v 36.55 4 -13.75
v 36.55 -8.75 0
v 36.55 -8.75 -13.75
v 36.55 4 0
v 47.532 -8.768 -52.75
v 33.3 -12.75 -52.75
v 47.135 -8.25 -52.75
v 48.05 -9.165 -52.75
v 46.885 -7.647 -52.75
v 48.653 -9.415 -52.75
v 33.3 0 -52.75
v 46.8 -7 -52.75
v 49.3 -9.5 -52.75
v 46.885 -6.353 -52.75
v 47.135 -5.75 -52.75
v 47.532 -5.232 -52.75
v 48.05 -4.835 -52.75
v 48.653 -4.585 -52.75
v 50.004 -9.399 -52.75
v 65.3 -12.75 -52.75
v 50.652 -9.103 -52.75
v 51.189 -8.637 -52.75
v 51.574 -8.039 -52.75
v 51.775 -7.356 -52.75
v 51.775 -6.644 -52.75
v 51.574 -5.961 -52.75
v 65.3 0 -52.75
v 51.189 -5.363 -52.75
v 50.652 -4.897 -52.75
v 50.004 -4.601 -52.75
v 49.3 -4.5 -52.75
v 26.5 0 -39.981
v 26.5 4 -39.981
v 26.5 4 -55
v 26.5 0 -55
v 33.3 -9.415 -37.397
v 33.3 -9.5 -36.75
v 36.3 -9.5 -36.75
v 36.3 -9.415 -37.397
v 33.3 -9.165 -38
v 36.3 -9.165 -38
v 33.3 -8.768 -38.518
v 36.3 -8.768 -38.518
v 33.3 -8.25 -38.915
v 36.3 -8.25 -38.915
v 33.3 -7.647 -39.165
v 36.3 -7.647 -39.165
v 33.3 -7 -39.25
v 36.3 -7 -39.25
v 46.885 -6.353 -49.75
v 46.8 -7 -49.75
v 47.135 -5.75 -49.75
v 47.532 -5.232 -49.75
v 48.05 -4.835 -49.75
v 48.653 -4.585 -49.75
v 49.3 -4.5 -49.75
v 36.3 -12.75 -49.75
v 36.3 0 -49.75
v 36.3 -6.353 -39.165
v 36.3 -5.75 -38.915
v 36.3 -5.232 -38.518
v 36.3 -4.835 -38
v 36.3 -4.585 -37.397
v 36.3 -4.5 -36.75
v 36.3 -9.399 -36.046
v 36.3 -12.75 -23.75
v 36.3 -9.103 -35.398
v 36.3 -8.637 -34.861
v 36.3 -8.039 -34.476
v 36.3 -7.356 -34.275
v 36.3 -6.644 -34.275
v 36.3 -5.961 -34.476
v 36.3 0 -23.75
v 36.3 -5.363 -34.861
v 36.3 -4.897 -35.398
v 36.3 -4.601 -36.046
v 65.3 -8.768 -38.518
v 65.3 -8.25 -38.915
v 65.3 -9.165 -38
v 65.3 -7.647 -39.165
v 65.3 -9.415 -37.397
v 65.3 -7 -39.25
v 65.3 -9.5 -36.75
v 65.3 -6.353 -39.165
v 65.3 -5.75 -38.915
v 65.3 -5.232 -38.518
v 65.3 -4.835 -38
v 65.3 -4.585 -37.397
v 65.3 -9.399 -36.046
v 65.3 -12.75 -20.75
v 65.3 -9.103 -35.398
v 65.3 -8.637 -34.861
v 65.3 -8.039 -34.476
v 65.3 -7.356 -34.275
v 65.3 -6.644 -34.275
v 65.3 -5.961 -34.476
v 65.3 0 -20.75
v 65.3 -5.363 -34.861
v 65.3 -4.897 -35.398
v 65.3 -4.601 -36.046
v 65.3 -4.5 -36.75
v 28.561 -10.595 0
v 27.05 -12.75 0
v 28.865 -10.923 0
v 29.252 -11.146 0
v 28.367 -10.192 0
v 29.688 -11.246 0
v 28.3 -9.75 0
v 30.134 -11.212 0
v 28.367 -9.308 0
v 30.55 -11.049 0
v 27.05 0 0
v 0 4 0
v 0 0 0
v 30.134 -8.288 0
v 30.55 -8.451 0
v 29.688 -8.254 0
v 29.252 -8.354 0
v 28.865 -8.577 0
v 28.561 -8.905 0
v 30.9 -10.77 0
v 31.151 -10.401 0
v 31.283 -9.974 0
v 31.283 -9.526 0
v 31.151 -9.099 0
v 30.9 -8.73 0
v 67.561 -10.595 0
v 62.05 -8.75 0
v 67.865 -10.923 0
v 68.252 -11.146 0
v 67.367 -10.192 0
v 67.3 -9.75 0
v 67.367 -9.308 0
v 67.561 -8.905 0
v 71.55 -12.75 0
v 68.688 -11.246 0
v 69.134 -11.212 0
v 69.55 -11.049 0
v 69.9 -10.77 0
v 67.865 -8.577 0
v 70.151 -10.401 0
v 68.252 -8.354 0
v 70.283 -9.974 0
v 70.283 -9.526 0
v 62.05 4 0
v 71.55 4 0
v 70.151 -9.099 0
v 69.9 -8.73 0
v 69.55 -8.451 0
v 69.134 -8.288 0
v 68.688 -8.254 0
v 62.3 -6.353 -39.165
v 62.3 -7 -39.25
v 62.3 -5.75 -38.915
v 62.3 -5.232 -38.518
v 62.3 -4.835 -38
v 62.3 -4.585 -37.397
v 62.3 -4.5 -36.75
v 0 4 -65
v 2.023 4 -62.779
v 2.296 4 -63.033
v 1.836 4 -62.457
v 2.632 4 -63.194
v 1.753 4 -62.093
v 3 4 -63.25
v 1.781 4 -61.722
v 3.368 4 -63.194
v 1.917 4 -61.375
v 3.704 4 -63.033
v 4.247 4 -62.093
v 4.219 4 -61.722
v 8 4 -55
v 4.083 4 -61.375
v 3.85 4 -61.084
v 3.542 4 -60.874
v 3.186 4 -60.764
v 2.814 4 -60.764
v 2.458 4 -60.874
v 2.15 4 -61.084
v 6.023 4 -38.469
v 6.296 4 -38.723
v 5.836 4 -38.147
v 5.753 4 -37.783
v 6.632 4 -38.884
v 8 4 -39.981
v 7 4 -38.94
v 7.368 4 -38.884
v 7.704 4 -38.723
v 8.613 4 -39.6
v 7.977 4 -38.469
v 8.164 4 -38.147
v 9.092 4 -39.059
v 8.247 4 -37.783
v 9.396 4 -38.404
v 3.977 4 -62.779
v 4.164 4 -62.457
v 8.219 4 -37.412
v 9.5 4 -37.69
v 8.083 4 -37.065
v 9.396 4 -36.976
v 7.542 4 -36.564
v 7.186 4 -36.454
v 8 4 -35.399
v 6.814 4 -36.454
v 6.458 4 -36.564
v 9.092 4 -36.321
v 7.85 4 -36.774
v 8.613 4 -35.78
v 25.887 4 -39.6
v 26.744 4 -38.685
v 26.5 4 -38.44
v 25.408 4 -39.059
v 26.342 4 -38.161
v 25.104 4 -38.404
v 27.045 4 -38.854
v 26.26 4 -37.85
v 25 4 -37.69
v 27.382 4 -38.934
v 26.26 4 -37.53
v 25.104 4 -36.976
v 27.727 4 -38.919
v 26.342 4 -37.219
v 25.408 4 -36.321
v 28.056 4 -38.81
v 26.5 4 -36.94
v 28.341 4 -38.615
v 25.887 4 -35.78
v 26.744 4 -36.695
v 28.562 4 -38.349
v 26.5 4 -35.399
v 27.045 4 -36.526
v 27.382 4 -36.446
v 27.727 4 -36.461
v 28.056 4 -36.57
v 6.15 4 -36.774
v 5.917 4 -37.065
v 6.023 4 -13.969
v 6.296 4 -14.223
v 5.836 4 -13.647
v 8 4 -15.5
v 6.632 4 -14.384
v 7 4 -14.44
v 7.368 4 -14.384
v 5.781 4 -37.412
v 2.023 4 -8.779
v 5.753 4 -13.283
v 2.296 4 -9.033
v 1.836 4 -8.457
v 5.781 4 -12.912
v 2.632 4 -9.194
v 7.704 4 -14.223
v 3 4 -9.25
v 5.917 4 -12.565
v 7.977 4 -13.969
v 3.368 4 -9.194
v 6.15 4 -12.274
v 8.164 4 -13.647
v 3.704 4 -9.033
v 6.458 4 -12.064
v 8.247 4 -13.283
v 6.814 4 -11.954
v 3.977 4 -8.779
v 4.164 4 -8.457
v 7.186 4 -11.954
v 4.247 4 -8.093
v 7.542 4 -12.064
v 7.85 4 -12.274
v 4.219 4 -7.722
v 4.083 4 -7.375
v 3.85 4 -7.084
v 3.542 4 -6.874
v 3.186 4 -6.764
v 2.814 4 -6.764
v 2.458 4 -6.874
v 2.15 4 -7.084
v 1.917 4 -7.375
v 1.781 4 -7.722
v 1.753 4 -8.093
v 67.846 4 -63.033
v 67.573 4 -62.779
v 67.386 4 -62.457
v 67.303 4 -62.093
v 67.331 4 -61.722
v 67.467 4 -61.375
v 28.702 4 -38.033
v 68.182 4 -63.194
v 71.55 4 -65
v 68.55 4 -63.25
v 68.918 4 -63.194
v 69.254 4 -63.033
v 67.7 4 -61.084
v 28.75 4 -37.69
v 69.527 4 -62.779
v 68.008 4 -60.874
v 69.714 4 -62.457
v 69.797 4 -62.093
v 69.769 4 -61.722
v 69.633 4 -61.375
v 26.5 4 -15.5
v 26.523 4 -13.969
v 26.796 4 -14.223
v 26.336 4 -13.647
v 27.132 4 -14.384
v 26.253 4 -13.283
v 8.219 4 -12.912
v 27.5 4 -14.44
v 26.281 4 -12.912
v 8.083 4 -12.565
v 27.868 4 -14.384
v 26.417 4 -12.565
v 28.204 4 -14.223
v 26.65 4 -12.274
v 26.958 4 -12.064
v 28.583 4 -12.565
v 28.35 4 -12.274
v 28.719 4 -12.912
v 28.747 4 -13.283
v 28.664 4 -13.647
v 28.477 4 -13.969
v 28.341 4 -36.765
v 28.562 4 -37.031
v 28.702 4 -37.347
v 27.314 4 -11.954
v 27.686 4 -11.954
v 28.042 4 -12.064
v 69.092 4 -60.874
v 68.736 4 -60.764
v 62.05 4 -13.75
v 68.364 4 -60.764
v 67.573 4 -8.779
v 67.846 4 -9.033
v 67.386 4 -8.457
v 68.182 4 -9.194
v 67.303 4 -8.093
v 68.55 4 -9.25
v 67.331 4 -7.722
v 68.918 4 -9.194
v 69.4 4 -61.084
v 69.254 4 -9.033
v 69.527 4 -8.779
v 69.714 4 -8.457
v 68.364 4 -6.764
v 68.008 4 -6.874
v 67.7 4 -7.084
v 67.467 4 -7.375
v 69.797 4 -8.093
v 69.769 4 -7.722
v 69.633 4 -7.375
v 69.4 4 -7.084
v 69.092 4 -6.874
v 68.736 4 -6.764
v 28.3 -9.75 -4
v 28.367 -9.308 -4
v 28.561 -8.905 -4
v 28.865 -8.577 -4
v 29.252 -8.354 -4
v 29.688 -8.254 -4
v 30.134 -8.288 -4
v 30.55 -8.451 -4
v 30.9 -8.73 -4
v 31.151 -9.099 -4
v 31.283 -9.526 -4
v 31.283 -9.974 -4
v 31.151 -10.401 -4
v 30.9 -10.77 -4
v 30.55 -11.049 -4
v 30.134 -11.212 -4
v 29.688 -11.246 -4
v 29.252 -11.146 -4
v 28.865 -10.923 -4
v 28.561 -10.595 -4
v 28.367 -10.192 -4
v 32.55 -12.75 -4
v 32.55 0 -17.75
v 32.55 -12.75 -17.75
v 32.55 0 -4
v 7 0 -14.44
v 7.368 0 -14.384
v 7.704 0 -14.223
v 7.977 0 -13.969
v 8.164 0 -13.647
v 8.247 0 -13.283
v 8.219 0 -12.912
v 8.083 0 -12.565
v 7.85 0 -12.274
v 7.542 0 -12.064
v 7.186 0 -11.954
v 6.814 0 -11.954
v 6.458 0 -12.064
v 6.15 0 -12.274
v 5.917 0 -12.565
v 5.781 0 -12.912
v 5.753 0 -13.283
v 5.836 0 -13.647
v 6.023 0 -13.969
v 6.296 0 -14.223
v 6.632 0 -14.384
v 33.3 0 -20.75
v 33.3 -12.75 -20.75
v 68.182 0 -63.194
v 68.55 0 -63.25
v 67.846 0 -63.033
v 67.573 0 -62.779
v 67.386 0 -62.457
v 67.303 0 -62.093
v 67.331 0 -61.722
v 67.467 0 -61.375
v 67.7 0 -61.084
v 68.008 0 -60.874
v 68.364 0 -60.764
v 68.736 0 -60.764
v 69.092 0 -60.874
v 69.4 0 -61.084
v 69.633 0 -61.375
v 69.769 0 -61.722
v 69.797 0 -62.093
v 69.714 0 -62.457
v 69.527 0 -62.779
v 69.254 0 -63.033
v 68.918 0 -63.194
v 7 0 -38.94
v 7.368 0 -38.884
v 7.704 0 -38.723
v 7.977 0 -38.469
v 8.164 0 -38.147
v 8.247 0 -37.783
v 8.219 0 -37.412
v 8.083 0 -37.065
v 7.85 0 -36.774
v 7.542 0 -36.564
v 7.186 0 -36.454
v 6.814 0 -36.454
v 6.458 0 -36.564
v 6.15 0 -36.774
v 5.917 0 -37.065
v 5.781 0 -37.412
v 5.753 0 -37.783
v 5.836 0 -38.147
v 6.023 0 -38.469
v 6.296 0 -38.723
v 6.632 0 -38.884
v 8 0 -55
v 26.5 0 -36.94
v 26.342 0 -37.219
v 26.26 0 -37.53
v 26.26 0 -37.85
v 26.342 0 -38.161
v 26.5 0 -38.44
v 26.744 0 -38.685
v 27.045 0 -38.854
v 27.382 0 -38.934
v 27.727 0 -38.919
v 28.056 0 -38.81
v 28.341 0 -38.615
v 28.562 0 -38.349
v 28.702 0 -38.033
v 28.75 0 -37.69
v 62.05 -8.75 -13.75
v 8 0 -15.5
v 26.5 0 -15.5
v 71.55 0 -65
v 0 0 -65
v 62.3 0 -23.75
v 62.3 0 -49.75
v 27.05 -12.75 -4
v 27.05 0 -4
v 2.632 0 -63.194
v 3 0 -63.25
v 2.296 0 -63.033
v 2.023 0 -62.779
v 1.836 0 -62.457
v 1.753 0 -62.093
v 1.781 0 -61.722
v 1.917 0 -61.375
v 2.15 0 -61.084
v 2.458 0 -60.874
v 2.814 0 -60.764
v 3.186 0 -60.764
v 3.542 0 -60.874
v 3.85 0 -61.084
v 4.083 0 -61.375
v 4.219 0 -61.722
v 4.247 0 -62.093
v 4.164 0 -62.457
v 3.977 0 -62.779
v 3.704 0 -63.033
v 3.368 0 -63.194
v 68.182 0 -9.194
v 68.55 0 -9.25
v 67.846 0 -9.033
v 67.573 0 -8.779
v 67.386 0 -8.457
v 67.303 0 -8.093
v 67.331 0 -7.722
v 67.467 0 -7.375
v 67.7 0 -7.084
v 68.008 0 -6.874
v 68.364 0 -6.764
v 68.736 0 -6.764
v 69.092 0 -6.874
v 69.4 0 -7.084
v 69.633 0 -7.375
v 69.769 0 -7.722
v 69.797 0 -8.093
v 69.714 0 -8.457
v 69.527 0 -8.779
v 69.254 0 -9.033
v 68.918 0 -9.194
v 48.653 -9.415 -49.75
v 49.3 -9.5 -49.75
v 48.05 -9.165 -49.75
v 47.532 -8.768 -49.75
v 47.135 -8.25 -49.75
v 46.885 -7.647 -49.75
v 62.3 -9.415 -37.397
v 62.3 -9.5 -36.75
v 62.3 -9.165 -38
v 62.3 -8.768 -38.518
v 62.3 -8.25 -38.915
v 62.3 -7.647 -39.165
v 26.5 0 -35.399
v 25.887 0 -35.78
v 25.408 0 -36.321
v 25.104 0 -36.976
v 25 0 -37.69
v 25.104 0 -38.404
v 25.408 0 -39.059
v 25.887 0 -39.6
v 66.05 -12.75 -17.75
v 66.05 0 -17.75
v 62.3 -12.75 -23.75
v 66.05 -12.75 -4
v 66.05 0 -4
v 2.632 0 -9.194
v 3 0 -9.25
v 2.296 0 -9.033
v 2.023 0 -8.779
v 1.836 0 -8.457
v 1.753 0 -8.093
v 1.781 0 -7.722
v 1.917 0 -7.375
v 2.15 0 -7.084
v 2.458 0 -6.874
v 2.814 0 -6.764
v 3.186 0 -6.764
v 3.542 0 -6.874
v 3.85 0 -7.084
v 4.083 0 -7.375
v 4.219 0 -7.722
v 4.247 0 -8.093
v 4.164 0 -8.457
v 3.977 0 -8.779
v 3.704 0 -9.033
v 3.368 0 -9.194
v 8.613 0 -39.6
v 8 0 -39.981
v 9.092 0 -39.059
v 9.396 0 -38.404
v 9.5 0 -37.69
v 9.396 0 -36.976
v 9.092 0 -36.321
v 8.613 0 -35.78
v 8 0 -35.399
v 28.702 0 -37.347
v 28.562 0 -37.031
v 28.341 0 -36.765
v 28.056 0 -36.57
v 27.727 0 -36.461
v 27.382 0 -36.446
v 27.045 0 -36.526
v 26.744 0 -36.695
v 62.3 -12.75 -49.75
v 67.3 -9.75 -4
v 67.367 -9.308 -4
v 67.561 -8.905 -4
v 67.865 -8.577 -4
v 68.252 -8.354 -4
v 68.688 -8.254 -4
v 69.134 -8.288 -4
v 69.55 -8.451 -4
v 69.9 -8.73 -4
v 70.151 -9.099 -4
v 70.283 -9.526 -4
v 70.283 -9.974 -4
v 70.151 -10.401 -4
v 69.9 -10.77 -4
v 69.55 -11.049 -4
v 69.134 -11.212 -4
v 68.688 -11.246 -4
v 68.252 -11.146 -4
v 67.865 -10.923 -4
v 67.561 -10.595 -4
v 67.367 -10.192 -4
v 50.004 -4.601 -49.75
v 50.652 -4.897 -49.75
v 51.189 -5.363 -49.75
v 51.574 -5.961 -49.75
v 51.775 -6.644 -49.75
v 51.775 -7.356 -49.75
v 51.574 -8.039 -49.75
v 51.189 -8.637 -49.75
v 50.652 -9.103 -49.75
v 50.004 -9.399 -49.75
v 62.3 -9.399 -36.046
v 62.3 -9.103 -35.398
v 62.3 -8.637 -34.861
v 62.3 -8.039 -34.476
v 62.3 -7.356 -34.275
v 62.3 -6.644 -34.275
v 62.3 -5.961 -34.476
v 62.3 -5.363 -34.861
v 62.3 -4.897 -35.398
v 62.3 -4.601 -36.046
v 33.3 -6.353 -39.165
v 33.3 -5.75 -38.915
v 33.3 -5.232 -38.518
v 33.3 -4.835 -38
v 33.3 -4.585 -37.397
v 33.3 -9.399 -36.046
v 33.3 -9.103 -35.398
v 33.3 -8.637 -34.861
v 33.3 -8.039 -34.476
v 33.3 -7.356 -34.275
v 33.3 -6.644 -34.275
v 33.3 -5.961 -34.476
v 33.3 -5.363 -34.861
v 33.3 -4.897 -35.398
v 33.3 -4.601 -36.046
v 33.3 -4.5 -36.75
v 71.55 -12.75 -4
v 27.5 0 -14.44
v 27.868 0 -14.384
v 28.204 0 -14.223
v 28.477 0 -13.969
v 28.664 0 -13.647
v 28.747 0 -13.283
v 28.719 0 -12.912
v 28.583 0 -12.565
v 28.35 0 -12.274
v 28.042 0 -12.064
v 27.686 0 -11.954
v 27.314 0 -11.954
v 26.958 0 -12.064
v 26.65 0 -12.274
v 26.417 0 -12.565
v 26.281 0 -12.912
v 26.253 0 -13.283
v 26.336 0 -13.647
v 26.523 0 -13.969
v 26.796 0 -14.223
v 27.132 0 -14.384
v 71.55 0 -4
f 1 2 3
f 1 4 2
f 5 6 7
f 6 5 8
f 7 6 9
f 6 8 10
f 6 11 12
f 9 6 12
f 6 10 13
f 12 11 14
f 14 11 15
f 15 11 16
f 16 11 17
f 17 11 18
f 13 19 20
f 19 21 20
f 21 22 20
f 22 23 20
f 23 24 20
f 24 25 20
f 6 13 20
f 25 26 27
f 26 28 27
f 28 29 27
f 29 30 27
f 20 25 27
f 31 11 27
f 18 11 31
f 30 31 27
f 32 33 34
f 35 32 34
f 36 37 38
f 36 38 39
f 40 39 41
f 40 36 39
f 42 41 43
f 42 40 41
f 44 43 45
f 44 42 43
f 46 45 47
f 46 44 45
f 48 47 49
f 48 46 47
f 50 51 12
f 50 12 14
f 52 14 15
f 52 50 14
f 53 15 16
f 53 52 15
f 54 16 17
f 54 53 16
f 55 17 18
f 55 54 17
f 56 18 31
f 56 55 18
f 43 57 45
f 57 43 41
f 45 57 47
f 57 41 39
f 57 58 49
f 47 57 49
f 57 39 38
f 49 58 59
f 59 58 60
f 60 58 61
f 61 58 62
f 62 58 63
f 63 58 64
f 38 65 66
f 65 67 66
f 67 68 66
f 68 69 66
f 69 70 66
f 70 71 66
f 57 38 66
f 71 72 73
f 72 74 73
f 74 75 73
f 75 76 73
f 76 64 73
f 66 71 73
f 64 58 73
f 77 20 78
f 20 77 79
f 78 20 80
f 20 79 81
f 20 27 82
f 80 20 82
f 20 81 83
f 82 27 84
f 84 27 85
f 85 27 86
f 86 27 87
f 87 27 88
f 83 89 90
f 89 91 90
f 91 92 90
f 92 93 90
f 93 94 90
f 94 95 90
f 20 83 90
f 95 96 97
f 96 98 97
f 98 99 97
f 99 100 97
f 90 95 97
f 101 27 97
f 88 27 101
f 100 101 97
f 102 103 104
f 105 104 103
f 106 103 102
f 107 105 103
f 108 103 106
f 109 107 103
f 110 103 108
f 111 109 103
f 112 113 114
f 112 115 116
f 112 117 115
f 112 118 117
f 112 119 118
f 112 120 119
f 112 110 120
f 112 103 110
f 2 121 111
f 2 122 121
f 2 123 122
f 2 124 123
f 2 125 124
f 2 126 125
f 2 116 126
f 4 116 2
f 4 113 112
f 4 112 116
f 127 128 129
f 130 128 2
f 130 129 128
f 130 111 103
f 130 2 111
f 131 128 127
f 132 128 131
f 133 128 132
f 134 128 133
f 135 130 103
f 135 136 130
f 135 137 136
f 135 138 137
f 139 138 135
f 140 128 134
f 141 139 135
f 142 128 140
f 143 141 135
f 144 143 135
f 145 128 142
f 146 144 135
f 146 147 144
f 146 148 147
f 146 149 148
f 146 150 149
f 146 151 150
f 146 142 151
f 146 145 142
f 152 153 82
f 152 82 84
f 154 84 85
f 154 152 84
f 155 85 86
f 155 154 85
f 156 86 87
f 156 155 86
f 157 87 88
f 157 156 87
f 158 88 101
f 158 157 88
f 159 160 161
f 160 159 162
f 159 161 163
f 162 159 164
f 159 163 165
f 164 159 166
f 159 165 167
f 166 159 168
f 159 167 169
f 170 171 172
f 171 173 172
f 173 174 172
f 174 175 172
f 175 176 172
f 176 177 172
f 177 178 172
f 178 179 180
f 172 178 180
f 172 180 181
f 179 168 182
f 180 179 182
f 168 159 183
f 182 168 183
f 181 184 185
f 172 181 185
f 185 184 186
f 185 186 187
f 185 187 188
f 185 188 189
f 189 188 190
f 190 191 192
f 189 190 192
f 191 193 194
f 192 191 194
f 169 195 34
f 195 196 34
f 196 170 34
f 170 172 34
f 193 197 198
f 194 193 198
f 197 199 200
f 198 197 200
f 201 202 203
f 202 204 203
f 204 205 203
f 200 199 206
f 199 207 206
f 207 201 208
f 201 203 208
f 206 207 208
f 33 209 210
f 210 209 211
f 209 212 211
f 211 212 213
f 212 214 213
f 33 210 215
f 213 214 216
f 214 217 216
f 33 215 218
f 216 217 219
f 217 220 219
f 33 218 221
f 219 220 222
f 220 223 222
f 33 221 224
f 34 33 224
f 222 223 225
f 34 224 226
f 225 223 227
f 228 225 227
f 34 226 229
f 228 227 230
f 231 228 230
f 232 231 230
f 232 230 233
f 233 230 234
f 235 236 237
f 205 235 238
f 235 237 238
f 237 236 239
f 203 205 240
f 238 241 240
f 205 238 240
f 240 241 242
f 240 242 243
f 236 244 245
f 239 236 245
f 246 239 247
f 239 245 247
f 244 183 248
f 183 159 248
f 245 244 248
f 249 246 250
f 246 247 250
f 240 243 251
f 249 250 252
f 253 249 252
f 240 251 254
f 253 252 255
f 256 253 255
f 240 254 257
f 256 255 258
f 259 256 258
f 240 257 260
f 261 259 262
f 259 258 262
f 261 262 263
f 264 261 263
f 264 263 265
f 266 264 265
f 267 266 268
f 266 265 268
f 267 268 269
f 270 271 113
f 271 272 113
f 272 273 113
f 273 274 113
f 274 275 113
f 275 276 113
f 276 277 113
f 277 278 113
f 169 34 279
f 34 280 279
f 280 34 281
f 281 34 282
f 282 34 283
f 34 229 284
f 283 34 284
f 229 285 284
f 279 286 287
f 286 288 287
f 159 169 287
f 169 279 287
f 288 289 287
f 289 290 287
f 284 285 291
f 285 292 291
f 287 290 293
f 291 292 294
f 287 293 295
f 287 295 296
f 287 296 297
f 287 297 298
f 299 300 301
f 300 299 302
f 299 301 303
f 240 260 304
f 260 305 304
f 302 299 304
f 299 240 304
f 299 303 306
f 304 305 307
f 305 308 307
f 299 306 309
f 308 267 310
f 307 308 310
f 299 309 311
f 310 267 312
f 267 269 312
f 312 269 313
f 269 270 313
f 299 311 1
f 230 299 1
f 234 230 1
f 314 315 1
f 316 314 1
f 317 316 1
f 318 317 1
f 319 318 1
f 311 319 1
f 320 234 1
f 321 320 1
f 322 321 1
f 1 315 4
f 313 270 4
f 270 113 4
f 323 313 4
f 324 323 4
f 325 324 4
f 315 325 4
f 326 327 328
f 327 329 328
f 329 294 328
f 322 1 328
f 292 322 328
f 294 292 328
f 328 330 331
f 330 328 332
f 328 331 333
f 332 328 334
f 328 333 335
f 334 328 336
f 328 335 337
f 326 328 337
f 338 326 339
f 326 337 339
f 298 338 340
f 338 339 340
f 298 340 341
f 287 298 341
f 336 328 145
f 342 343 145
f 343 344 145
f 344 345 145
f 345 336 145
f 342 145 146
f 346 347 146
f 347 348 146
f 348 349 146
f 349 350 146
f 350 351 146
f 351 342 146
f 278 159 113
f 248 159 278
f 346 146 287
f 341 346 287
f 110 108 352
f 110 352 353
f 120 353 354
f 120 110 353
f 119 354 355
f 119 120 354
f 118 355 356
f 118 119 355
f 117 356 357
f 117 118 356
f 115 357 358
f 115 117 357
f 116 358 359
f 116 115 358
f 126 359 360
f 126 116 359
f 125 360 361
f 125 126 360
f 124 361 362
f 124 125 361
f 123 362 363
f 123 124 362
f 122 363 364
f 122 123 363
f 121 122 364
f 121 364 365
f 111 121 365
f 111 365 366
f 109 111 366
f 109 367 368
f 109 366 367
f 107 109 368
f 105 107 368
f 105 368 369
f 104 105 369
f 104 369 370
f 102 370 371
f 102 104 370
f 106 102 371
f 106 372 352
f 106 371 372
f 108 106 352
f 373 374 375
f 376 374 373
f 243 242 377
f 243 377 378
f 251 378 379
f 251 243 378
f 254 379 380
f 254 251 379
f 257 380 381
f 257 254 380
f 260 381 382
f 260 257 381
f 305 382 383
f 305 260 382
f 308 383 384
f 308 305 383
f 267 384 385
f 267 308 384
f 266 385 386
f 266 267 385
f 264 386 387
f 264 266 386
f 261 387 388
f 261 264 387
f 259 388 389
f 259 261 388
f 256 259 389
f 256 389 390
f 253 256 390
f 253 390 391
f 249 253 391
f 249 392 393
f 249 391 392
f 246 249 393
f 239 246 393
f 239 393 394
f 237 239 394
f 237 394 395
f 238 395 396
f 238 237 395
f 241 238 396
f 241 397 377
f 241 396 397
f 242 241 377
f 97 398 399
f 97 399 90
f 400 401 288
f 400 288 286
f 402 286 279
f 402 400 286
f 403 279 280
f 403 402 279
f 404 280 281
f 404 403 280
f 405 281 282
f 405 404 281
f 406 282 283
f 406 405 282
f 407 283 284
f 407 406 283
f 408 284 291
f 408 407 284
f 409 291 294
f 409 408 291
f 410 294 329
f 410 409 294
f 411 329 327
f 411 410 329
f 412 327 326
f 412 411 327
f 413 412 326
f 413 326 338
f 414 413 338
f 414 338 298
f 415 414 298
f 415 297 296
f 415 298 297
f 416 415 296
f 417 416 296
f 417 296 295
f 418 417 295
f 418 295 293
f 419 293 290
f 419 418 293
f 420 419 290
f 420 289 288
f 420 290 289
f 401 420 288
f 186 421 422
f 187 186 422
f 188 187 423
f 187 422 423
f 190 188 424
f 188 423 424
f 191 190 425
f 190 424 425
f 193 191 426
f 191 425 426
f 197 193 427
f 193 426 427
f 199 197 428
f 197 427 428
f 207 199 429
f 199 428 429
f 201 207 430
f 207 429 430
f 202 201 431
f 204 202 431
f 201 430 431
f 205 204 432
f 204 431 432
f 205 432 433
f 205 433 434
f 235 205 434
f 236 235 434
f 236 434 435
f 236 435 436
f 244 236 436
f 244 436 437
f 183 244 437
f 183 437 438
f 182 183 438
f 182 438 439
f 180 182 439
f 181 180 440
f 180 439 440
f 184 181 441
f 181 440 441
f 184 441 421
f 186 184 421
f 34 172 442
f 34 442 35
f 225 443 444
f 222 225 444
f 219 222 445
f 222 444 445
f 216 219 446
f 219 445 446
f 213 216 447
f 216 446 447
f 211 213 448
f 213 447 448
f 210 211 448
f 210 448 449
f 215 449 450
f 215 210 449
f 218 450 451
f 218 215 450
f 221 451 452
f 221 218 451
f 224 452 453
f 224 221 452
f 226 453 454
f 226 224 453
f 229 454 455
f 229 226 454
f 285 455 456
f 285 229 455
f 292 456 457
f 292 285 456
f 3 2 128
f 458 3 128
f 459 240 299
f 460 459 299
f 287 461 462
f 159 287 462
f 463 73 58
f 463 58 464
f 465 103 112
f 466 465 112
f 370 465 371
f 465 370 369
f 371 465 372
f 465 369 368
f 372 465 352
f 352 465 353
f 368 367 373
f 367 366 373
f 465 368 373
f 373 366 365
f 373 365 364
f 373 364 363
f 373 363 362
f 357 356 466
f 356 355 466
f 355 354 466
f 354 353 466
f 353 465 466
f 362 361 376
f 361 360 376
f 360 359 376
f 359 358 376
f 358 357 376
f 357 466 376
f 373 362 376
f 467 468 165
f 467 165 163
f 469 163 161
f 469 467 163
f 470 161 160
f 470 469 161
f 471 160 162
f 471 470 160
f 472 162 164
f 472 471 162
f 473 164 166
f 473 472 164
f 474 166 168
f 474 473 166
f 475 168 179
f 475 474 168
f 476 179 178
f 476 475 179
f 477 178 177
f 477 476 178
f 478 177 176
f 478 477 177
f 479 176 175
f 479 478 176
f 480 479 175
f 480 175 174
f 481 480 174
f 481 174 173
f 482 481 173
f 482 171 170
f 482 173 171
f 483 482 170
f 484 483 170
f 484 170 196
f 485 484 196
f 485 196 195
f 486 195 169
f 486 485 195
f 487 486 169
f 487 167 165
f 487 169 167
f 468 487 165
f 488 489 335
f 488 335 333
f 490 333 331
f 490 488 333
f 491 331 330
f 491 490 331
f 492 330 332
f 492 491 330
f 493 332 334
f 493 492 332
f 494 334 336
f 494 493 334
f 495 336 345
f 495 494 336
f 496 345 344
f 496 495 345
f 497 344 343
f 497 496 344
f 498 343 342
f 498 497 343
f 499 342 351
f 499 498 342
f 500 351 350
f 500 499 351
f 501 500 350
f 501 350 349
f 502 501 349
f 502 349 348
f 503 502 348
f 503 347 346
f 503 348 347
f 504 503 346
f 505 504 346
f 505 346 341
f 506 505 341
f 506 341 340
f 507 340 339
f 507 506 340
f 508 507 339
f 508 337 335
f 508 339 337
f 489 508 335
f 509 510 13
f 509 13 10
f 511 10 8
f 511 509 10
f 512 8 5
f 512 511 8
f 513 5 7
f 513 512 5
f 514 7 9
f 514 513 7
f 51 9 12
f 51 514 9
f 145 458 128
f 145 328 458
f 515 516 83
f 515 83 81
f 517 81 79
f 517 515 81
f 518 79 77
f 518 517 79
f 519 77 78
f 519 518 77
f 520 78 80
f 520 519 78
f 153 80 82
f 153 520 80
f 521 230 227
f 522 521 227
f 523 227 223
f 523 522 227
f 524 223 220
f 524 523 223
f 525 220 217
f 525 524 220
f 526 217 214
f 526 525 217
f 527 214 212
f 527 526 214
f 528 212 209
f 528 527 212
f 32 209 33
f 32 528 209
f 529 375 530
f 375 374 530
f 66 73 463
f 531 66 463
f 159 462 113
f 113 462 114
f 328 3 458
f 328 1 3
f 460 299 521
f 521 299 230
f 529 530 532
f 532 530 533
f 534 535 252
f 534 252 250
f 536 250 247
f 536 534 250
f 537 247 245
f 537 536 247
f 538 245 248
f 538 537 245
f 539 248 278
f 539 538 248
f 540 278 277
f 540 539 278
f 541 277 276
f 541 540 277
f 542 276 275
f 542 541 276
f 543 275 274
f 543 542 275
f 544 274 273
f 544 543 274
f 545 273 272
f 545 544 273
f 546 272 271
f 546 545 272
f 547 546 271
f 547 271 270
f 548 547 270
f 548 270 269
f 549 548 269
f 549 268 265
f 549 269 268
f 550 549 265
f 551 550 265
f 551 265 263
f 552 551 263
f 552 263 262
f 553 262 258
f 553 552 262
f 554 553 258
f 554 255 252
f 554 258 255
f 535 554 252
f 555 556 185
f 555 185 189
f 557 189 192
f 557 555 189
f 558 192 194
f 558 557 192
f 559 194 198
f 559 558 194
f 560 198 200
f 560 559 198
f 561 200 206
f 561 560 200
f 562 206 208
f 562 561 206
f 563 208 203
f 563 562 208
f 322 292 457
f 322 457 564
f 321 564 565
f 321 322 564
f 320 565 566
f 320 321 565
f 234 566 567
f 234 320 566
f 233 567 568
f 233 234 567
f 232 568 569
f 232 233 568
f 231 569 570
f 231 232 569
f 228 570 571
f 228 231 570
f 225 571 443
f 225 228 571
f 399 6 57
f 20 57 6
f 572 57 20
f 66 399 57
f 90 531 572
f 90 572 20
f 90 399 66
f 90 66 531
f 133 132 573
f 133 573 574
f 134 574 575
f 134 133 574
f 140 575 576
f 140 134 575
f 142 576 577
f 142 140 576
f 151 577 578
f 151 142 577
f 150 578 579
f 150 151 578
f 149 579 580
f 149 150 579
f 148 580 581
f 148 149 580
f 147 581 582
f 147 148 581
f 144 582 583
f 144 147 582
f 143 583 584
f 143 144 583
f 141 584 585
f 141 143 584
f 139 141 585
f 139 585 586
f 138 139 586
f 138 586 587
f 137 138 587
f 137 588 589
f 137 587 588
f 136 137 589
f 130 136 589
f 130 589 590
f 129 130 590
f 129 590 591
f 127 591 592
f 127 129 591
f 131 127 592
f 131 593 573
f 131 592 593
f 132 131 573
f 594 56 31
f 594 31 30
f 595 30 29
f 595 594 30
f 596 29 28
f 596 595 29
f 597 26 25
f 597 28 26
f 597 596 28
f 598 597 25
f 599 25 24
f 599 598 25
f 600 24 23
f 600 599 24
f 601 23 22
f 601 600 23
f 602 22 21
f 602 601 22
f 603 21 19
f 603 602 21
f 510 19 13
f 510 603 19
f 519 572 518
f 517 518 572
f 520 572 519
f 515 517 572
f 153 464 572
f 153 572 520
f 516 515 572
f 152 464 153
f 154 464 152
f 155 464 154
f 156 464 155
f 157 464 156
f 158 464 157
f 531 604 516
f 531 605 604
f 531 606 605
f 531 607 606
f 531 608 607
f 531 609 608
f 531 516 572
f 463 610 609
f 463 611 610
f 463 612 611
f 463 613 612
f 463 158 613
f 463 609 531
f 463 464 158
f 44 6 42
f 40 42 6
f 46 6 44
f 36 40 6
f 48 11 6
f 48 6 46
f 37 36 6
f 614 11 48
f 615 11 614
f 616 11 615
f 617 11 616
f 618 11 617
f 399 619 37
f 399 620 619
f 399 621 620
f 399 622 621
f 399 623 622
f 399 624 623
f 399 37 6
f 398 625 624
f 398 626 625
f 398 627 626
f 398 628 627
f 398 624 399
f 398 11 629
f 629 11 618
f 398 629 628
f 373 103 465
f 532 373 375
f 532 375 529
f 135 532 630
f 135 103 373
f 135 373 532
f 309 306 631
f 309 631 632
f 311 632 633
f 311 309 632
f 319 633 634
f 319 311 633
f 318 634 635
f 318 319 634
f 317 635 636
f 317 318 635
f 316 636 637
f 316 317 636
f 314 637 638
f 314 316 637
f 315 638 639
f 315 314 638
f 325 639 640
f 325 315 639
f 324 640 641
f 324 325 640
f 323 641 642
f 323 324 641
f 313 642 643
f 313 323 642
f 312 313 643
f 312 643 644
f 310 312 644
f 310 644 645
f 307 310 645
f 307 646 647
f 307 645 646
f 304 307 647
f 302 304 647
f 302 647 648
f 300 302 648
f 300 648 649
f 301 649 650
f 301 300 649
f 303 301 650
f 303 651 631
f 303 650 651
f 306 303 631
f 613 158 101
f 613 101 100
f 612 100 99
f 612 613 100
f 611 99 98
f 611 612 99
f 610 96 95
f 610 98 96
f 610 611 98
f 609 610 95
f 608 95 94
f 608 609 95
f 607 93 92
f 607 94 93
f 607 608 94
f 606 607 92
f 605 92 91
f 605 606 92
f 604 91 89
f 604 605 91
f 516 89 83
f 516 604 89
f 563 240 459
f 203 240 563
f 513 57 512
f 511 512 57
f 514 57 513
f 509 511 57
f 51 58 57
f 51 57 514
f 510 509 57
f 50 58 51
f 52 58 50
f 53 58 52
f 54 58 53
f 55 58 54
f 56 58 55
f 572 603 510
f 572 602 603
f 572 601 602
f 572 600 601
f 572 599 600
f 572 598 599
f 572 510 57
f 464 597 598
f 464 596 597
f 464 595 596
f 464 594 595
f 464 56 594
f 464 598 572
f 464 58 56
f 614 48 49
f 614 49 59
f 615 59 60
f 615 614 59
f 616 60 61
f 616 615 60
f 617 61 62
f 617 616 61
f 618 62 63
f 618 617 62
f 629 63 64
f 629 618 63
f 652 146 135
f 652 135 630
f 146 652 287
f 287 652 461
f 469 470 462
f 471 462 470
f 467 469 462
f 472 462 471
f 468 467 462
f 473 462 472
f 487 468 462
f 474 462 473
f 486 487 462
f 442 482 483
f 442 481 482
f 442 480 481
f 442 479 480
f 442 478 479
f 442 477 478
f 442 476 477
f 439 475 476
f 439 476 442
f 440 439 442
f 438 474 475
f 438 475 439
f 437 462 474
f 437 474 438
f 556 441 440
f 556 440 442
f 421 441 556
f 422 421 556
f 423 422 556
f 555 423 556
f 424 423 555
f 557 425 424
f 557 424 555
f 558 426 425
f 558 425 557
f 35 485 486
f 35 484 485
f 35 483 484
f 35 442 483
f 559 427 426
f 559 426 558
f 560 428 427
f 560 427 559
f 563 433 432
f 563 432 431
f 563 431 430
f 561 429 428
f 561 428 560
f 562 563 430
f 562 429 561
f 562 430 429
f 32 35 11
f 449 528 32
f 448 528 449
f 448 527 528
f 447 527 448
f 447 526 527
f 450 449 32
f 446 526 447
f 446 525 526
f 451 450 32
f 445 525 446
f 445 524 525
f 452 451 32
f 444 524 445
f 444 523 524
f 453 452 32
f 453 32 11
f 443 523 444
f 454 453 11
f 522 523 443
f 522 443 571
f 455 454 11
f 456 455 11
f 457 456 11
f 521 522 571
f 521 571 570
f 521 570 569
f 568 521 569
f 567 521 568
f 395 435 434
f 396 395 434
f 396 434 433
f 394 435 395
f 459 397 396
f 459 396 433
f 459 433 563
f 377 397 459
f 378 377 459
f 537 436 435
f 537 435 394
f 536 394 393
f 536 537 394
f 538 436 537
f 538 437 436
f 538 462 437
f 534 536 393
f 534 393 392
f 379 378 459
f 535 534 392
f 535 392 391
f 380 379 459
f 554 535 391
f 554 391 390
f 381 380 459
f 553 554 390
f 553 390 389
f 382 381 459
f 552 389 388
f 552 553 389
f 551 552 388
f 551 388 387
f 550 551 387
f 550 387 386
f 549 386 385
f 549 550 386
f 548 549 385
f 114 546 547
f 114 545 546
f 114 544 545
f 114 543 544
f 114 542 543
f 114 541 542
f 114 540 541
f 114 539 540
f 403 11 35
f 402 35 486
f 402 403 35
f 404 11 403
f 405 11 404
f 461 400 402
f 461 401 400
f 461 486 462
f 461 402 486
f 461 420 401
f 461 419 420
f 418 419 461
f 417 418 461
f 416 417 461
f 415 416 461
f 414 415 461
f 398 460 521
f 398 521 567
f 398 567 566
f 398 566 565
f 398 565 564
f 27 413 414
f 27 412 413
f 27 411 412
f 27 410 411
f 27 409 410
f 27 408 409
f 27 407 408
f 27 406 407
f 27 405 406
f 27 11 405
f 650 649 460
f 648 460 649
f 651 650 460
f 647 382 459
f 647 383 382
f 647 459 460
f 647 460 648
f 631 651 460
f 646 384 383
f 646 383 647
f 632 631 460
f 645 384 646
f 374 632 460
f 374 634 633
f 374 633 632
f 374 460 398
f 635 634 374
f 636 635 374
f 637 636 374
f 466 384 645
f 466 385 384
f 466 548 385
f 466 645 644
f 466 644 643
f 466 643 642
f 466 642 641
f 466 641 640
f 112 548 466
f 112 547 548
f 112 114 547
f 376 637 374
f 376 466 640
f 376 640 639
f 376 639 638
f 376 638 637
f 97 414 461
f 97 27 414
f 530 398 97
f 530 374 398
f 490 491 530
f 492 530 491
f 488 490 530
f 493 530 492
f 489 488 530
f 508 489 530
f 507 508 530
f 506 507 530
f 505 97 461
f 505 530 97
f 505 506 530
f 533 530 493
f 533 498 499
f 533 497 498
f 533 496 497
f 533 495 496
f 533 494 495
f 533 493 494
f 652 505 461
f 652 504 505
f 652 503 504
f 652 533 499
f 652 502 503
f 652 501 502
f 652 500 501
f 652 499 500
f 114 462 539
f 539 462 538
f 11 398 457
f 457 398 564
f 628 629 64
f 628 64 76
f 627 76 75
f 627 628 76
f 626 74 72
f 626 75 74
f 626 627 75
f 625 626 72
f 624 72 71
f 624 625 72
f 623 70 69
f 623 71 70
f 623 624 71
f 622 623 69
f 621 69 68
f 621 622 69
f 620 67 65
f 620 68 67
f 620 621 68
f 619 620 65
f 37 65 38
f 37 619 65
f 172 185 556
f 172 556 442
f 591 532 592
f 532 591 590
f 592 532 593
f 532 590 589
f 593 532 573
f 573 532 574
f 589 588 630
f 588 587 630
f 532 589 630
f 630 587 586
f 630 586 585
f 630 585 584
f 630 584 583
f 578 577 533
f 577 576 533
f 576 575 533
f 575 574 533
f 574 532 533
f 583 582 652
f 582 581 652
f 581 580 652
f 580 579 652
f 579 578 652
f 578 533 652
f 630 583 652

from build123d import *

# Parameters (mm, degrees)
BOSS_EXTRUDE1_DEPTH     = 4
BOSS_EXTRUDE2_DEPTH     = 8.75
SKETCH3_W               = 33.5
SKETCH3_H               = 17.75
BOSS_EXTRUDE3_DEPTH     = 4
SKETCH4_W               = 18.5
SKETCH4_H               = 39.5
CUT_EXTRUDE1_DEPTH      = 4
SKETCH5_W               = 5.5
SKETCH5_H               = 12.75
BOSS_EXTRUDE4_DEPTH     = 4
CUT_EXTRUDE2_DEPTH      = 98.503666598
CUT_EXTRUDE2_DEPTH_BACK = 98.503666598
SKETCH6_R               = 1.25
SKETCH7_R               = 2.5
SKETCH7_R_2             = 1.25
BOSS_EXTRUDE5_DEPTH     = 4
CUT_EXTRUDE3_DEPTH      = 99.106905975
CUT_EXTRUDE3_DEPTH_BACK = 99.106905975
SKETCH8_R               = 1.25
CUT_EXTRUDE4_DEPTH      = 95.88395544
CUT_EXTRUDE4_DEPTH_BACK = 95.88395544
SKETCH9_R               = 1.5
SKETCH11_W              = 32
SKETCH11_H              = 32
SKETCH11_W_2            = 26
SKETCH11_H_2            = 26
BOSS_EXTRUDE6_DEPTH     = 12.75
CUT_EXTRUDE6_DEPTH      = 94.014259659
CUT_EXTRUDE6_DEPTH_BACK = 94.014259659
CUT_EXTRUDE7_DEPTH      = 90.802714324
CUT_EXTRUDE7_DEPTH_BACK = 5


with BuildPart() as part:
    # Sketch1 → Boss-Extrude1 (new body)
    with BuildSketch(Plane(origin=(0, 0, 0), x_dir=(1, 0, 0), z_dir=(0, 1, 0))):
        Polygon((0, 0), (36.55, 0), (36.55, 13.75), (62.05, 13.75), (62.05, 0), (71.55, 0), (71.55, 65), (0, 65), align=None)
    extrude(amount=BOSS_EXTRUDE1_DEPTH)

    # Sketch2 → Boss-Extrude2 (add)
    with BuildSketch(Plane(origin=(0, 0, 0), x_dir=(1, 0, 0), z_dir=(0, 1, 0))):
        Polygon((62.05, 13.75), (62.05, 0), (66.05, 0), (66.05, 17.75), (32.55, 17.75), (32.55, 0), (36.55, 0), (36.55, 13.75), align=None)
    extrude(amount=-BOSS_EXTRUDE2_DEPTH)

    # Sketch3 → Boss-Extrude3 (add)
    with BuildSketch(Plane.XZ.offset(8.75)):
        with Locations((49.3, -8.875)):
            Rectangle(SKETCH3_W, SKETCH3_H)
    extrude(amount=BOSS_EXTRUDE3_DEPTH)

    # Sketch4 → Cut-Extrude1 (cut)
    with BuildSketch(Plane(origin=(0, 4, 0), x_dir=(1, 0, 0), z_dir=(0, 1, 0))):
        with Locations((17.25, 35.25)):
            Rectangle(SKETCH4_W, SKETCH4_H)
    extrude(amount=-CUT_EXTRUDE1_DEPTH, mode=Mode.SUBTRACT)

    # Sketch5 → Boss-Extrude4 (add)
    with BuildSketch(Plane.XY):
        with Locations((29.8, -6.375)):
            Rectangle(SKETCH5_W, SKETCH5_H)
        with Locations((68.8, -6.375)):
            Rectangle(SKETCH5_W, SKETCH5_H)
    extrude(amount=-BOSS_EXTRUDE4_DEPTH)

    # Sketch6 → Cut-Extrude2 (cut, two sides: drawn at the far end of the back side and taken through both)
    with BuildSketch(Plane.XZ.offset(-CUT_EXTRUDE2_DEPTH_BACK)):
        with Locations(Location((7, -13.19, 0), (0, 0, 270))):
            Circle(SKETCH6_R)
        with Locations(Location((27.5, -13.19, 0), (0, 0, 270))):
            Circle(SKETCH6_R)
        with BuildLine():
            ThreePointArc((26.5, -38.44), (27.895284708, -38.875854123), (28.75, -37.69))
            ThreePointArc((28.75, -37.69), (27.895284708, -36.504145877), (26.5, -36.94))
            Line((26.5, -36.94), (26.5, -38.44))
        make_face()
        with BuildLine():
            Line((26.5, -38.44), (26.5, -36.94))
            ThreePointArc((26.5, -36.94), (26.25, -37.69), (26.5, -38.44))
        make_face()
        with BuildLine():
            ThreePointArc((8, -38.44), (8.185854123, -38.085284708), (8.25, -37.69))
            ThreePointArc((8.25, -37.69), (8.185854123, -37.294715292), (8, -36.94))
            Line((8, -36.94), (8, -38.44))
        make_face()
        with BuildLine():
            Line((8, -38.44), (8, -36.94))
            ThreePointArc((8, -36.94), (5.75, -37.69), (8, -38.44))
        make_face()
    extrude(amount=CUT_EXTRUDE2_DEPTH + CUT_EXTRUDE2_DEPTH_BACK, mode=Mode.SUBTRACT)

    # Sketch7 → Boss-Extrude5 (add)
    # profile 1 of 2: a face of its own
    with BuildSketch(Plane.XZ):
        with Locations((7, -37.69)):
            Circle(SKETCH7_R)
        with Locations(Location((7, -37.69, 0), (0, 0, 270))):
            Circle(SKETCH7_R_2, mode=Mode.SUBTRACT)
    # profile 2 of 2: a face of its own
    with BuildSketch(Plane.XZ):
        with Locations((27.5, -37.69)):
            Circle(SKETCH7_R)
        with Locations(Location((27.5, -37.69, 0), (0, 0, 270))):
            Circle(SKETCH7_R_2, mode=Mode.SUBTRACT)
    extrude(amount=-BOSS_EXTRUDE5_DEPTH)

    # Sketch8 → Cut-Extrude3 (cut, two sides: drawn at the far end of the back side and taken through both)
    with BuildSketch(Plane(origin=(0, 4, 0), x_dir=(1, 0, 0), z_dir=(0, 1, 0)).offset(-CUT_EXTRUDE3_DEPTH_BACK)):
        with Locations(Location((3, 62, 0), (0, 0, 90))):
            Circle(SKETCH8_R)
        with Locations(Location((68.55, 62, 0), (0, 0, 90))):
            Circle(SKETCH8_R)
        with Locations(Location((68.55, 8, 0), (0, 0, 90))):
            Circle(SKETCH8_R)
        with Locations(Location((3, 8, 0), (0, 0, 90))):
            Circle(SKETCH8_R)
    extrude(amount=CUT_EXTRUDE3_DEPTH + CUT_EXTRUDE3_DEPTH_BACK, mode=Mode.SUBTRACT)

    # Sketch9 → Cut-Extrude4 (cut, two sides: drawn at the far end of the back side and taken through both)
    with BuildSketch(Plane(origin=(0, 0, -4), x_dir=(-1, 0, 0), z_dir=(0, 0, -1)).offset(-CUT_EXTRUDE4_DEPTH_BACK)):
        with Locations((-68.8, -9.75)):
            Circle(SKETCH9_R)
        with Locations((-29.8, -9.75)):
            Circle(SKETCH9_R)
    extrude(amount=CUT_EXTRUDE4_DEPTH + CUT_EXTRUDE4_DEPTH_BACK, mode=Mode.SUBTRACT)

    # Sketch11 → Boss-Extrude6 (add)
    with BuildSketch(Plane.XZ):
        with Locations((49.3, -36.75)):
            Rectangle(SKETCH11_W, SKETCH11_H)
        with Locations((49.3, -36.75)):
            Rectangle(SKETCH11_W_2, SKETCH11_H_2, mode=Mode.SUBTRACT)
    extrude(amount=BOSS_EXTRUDE6_DEPTH)

    # Sketch12 → Cut-Extrude6 (cut, two sides: drawn at the far end of the back side and taken through both)
    with BuildSketch(Plane(origin=(65.3, 0, 0), x_dir=(0, 0, -1), z_dir=(1, 0, 0)).offset(-CUT_EXTRUDE6_DEPTH_BACK)):
        with BuildLine():
            ThreePointArc((39.25, -7), (38.517766953, -5.232233047), (36.75, -4.5))
            Line((36.75, -4.5), (36.75, -9.5))
            ThreePointArc((36.75, -9.5), (38.517766953, -8.767766953), (39.25, -7))
        make_face()
        with BuildLine():
            Line((36.75, -9.5), (36.75, -4.5))
            ThreePointArc((36.75, -4.5), (34.25, -7), (36.75, -9.5))
        make_face()
    extrude(amount=CUT_EXTRUDE6_DEPTH + CUT_EXTRUDE6_DEPTH_BACK, mode=Mode.SUBTRACT)

    # Sketch13 → Cut-Extrude7 (cut, two sides: drawn at the far end of the back side and taken through both)
    with BuildSketch(Plane(origin=(0, 0, -52.75), x_dir=(-1, 0, 0), z_dir=(0, 0, -1)).offset(-CUT_EXTRUDE7_DEPTH_BACK)):
        with BuildLine():
            ThreePointArc((-46.8, -7), (-47.532233047, -5.232233047), (-49.3, -4.5))
            Line((-49.3, -4.5), (-49.3, -9.5))
            ThreePointArc((-49.3, -9.5), (-47.532233047, -8.767766953), (-46.8, -7))
        make_face()
        with BuildLine():
            Line((-49.3, -9.5), (-49.3, -4.5))
            ThreePointArc((-49.3, -4.5), (-51.8, -7), (-49.3, -9.5))
        make_face()
    extrude(amount=CUT_EXTRUDE7_DEPTH + CUT_EXTRUDE7_DEPTH_BACK, mode=Mode.SUBTRACT)


solid = part.part
